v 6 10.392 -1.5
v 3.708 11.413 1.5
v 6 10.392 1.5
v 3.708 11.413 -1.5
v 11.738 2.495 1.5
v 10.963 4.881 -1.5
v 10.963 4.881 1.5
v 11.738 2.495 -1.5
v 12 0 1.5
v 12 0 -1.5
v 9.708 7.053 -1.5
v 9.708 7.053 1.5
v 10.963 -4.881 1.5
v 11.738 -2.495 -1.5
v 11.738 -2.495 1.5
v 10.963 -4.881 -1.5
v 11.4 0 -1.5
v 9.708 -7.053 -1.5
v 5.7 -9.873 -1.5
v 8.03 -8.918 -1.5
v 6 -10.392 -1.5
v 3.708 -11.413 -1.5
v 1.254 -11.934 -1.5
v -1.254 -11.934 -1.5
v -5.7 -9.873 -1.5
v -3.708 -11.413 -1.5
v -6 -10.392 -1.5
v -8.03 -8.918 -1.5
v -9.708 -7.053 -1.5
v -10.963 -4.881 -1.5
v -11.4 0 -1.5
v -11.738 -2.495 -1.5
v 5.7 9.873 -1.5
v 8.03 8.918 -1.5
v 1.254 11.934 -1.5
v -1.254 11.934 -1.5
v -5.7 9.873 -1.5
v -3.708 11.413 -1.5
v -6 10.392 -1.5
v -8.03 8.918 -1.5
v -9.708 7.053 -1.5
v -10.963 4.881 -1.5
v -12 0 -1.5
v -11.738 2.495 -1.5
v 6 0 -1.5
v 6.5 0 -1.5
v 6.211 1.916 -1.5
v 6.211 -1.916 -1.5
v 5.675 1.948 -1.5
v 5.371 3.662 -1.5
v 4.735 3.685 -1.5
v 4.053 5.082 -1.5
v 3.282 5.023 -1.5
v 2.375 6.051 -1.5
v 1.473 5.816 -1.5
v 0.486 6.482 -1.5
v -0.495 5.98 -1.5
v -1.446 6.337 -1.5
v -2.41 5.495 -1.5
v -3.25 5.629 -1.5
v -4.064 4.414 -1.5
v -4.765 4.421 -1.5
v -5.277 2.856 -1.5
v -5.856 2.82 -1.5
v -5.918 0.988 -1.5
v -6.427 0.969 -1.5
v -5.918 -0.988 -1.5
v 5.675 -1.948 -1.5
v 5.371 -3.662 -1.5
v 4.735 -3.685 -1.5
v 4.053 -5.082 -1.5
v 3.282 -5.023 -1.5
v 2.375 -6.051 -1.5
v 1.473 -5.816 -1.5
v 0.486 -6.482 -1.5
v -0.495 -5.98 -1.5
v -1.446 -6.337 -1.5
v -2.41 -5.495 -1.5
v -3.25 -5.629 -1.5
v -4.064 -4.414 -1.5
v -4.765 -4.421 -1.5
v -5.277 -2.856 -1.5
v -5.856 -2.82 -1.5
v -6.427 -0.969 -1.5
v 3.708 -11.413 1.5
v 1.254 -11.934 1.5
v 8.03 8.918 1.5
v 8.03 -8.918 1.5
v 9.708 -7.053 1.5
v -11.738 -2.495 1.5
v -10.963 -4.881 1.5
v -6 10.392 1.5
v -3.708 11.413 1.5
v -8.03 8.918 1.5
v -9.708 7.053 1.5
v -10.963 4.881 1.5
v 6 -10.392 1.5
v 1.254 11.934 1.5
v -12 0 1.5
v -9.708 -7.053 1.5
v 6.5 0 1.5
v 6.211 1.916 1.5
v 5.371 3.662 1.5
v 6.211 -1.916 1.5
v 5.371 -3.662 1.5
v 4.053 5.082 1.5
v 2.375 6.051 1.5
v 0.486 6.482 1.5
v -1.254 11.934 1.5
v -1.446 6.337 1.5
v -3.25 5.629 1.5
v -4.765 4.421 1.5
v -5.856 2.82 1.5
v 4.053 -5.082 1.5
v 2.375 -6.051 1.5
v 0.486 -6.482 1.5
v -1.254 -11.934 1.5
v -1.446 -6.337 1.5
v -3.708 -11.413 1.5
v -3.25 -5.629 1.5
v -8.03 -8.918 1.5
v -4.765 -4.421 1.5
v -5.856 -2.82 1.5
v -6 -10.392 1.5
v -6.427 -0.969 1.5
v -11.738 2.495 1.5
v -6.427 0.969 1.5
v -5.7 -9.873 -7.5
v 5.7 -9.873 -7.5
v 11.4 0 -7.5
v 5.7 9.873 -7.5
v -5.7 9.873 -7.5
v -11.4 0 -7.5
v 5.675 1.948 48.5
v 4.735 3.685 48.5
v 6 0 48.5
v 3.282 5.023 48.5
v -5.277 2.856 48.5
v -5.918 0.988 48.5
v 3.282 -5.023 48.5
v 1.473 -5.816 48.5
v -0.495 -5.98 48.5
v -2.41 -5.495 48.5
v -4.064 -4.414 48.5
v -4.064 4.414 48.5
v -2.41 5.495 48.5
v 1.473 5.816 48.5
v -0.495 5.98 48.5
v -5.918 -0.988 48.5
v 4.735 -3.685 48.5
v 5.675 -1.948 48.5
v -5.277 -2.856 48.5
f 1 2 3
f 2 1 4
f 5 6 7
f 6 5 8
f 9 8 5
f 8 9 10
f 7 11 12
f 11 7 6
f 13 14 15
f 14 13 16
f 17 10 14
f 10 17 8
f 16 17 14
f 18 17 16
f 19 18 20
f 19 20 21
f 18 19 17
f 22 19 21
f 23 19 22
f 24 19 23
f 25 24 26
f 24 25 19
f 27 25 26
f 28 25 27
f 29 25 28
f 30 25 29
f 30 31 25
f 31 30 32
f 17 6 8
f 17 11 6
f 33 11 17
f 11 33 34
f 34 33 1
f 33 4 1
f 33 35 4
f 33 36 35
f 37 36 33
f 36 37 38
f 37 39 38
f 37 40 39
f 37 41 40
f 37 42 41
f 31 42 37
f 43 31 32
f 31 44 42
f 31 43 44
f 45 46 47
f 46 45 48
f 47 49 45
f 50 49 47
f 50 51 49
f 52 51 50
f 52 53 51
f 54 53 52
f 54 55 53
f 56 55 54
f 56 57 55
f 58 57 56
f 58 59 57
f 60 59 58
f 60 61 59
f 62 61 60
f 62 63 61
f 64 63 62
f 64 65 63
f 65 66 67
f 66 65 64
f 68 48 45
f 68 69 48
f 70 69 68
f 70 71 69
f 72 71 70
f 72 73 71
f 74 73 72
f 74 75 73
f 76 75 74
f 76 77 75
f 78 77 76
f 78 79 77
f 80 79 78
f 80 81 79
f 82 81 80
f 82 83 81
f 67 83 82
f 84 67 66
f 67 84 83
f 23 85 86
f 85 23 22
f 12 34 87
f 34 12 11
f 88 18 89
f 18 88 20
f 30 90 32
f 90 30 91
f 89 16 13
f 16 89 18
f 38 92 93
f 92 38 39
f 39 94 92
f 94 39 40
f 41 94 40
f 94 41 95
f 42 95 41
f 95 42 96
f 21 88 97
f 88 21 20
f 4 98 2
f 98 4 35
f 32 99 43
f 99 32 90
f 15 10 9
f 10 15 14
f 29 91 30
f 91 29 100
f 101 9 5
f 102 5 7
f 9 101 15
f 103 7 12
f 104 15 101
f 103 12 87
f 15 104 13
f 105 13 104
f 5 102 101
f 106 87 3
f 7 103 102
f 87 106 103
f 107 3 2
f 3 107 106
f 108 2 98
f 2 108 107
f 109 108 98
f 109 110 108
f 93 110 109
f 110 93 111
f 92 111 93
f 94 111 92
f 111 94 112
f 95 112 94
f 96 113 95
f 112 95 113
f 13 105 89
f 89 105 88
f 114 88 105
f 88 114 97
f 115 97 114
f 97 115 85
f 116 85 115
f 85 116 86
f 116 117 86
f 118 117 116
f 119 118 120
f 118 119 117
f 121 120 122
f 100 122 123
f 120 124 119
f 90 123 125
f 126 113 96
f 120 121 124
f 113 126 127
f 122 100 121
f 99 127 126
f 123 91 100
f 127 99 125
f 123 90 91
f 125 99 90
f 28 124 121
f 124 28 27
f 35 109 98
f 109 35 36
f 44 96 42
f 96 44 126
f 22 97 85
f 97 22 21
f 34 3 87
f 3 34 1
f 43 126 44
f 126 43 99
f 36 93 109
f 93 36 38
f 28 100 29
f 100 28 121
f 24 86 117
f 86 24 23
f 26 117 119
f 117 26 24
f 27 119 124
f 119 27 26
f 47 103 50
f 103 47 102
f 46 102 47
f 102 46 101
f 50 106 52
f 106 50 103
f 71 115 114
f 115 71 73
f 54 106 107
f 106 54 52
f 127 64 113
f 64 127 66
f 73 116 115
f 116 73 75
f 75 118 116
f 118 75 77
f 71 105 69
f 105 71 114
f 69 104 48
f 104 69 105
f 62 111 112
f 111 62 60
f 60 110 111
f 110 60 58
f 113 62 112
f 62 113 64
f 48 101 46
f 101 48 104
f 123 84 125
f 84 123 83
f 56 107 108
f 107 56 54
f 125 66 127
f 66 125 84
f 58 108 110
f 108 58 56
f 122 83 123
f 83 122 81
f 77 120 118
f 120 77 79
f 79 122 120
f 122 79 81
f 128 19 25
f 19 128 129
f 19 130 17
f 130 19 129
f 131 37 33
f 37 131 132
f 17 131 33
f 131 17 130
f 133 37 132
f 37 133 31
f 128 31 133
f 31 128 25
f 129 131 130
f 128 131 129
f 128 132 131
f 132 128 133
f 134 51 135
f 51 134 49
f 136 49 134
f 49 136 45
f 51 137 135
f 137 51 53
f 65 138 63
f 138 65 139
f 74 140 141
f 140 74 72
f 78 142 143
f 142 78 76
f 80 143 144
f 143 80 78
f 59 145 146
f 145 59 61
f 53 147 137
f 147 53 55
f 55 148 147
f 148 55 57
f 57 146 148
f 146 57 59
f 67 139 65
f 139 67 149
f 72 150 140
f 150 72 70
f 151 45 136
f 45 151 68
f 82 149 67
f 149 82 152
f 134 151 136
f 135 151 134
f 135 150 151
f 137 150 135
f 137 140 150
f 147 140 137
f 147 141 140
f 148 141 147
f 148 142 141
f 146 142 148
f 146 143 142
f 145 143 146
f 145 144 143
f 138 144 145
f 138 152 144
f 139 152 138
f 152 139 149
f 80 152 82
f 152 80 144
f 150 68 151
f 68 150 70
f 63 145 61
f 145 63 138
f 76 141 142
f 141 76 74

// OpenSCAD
// file: washer.scad
module washer(d, h) {
  difference() {
    cylinder(d=2*d, h=h, center=true);
    cylinder(d=d+1, h=h+1, center=true);
  }
}
// file: bolt.scad
// Standard Bolt
module bolt(d, h) {
  cylinder(d=1.9 * d, h=d/2, $fn=6);
  translate ([0,0,d/2])
    cylinder(d=d, h=h);
}
// main file
use <bolt.scad>
use <washer.scad>

washer(d=12,h=3);
translate([0,0,-7.5])
  bolt(d=12,h=50);
